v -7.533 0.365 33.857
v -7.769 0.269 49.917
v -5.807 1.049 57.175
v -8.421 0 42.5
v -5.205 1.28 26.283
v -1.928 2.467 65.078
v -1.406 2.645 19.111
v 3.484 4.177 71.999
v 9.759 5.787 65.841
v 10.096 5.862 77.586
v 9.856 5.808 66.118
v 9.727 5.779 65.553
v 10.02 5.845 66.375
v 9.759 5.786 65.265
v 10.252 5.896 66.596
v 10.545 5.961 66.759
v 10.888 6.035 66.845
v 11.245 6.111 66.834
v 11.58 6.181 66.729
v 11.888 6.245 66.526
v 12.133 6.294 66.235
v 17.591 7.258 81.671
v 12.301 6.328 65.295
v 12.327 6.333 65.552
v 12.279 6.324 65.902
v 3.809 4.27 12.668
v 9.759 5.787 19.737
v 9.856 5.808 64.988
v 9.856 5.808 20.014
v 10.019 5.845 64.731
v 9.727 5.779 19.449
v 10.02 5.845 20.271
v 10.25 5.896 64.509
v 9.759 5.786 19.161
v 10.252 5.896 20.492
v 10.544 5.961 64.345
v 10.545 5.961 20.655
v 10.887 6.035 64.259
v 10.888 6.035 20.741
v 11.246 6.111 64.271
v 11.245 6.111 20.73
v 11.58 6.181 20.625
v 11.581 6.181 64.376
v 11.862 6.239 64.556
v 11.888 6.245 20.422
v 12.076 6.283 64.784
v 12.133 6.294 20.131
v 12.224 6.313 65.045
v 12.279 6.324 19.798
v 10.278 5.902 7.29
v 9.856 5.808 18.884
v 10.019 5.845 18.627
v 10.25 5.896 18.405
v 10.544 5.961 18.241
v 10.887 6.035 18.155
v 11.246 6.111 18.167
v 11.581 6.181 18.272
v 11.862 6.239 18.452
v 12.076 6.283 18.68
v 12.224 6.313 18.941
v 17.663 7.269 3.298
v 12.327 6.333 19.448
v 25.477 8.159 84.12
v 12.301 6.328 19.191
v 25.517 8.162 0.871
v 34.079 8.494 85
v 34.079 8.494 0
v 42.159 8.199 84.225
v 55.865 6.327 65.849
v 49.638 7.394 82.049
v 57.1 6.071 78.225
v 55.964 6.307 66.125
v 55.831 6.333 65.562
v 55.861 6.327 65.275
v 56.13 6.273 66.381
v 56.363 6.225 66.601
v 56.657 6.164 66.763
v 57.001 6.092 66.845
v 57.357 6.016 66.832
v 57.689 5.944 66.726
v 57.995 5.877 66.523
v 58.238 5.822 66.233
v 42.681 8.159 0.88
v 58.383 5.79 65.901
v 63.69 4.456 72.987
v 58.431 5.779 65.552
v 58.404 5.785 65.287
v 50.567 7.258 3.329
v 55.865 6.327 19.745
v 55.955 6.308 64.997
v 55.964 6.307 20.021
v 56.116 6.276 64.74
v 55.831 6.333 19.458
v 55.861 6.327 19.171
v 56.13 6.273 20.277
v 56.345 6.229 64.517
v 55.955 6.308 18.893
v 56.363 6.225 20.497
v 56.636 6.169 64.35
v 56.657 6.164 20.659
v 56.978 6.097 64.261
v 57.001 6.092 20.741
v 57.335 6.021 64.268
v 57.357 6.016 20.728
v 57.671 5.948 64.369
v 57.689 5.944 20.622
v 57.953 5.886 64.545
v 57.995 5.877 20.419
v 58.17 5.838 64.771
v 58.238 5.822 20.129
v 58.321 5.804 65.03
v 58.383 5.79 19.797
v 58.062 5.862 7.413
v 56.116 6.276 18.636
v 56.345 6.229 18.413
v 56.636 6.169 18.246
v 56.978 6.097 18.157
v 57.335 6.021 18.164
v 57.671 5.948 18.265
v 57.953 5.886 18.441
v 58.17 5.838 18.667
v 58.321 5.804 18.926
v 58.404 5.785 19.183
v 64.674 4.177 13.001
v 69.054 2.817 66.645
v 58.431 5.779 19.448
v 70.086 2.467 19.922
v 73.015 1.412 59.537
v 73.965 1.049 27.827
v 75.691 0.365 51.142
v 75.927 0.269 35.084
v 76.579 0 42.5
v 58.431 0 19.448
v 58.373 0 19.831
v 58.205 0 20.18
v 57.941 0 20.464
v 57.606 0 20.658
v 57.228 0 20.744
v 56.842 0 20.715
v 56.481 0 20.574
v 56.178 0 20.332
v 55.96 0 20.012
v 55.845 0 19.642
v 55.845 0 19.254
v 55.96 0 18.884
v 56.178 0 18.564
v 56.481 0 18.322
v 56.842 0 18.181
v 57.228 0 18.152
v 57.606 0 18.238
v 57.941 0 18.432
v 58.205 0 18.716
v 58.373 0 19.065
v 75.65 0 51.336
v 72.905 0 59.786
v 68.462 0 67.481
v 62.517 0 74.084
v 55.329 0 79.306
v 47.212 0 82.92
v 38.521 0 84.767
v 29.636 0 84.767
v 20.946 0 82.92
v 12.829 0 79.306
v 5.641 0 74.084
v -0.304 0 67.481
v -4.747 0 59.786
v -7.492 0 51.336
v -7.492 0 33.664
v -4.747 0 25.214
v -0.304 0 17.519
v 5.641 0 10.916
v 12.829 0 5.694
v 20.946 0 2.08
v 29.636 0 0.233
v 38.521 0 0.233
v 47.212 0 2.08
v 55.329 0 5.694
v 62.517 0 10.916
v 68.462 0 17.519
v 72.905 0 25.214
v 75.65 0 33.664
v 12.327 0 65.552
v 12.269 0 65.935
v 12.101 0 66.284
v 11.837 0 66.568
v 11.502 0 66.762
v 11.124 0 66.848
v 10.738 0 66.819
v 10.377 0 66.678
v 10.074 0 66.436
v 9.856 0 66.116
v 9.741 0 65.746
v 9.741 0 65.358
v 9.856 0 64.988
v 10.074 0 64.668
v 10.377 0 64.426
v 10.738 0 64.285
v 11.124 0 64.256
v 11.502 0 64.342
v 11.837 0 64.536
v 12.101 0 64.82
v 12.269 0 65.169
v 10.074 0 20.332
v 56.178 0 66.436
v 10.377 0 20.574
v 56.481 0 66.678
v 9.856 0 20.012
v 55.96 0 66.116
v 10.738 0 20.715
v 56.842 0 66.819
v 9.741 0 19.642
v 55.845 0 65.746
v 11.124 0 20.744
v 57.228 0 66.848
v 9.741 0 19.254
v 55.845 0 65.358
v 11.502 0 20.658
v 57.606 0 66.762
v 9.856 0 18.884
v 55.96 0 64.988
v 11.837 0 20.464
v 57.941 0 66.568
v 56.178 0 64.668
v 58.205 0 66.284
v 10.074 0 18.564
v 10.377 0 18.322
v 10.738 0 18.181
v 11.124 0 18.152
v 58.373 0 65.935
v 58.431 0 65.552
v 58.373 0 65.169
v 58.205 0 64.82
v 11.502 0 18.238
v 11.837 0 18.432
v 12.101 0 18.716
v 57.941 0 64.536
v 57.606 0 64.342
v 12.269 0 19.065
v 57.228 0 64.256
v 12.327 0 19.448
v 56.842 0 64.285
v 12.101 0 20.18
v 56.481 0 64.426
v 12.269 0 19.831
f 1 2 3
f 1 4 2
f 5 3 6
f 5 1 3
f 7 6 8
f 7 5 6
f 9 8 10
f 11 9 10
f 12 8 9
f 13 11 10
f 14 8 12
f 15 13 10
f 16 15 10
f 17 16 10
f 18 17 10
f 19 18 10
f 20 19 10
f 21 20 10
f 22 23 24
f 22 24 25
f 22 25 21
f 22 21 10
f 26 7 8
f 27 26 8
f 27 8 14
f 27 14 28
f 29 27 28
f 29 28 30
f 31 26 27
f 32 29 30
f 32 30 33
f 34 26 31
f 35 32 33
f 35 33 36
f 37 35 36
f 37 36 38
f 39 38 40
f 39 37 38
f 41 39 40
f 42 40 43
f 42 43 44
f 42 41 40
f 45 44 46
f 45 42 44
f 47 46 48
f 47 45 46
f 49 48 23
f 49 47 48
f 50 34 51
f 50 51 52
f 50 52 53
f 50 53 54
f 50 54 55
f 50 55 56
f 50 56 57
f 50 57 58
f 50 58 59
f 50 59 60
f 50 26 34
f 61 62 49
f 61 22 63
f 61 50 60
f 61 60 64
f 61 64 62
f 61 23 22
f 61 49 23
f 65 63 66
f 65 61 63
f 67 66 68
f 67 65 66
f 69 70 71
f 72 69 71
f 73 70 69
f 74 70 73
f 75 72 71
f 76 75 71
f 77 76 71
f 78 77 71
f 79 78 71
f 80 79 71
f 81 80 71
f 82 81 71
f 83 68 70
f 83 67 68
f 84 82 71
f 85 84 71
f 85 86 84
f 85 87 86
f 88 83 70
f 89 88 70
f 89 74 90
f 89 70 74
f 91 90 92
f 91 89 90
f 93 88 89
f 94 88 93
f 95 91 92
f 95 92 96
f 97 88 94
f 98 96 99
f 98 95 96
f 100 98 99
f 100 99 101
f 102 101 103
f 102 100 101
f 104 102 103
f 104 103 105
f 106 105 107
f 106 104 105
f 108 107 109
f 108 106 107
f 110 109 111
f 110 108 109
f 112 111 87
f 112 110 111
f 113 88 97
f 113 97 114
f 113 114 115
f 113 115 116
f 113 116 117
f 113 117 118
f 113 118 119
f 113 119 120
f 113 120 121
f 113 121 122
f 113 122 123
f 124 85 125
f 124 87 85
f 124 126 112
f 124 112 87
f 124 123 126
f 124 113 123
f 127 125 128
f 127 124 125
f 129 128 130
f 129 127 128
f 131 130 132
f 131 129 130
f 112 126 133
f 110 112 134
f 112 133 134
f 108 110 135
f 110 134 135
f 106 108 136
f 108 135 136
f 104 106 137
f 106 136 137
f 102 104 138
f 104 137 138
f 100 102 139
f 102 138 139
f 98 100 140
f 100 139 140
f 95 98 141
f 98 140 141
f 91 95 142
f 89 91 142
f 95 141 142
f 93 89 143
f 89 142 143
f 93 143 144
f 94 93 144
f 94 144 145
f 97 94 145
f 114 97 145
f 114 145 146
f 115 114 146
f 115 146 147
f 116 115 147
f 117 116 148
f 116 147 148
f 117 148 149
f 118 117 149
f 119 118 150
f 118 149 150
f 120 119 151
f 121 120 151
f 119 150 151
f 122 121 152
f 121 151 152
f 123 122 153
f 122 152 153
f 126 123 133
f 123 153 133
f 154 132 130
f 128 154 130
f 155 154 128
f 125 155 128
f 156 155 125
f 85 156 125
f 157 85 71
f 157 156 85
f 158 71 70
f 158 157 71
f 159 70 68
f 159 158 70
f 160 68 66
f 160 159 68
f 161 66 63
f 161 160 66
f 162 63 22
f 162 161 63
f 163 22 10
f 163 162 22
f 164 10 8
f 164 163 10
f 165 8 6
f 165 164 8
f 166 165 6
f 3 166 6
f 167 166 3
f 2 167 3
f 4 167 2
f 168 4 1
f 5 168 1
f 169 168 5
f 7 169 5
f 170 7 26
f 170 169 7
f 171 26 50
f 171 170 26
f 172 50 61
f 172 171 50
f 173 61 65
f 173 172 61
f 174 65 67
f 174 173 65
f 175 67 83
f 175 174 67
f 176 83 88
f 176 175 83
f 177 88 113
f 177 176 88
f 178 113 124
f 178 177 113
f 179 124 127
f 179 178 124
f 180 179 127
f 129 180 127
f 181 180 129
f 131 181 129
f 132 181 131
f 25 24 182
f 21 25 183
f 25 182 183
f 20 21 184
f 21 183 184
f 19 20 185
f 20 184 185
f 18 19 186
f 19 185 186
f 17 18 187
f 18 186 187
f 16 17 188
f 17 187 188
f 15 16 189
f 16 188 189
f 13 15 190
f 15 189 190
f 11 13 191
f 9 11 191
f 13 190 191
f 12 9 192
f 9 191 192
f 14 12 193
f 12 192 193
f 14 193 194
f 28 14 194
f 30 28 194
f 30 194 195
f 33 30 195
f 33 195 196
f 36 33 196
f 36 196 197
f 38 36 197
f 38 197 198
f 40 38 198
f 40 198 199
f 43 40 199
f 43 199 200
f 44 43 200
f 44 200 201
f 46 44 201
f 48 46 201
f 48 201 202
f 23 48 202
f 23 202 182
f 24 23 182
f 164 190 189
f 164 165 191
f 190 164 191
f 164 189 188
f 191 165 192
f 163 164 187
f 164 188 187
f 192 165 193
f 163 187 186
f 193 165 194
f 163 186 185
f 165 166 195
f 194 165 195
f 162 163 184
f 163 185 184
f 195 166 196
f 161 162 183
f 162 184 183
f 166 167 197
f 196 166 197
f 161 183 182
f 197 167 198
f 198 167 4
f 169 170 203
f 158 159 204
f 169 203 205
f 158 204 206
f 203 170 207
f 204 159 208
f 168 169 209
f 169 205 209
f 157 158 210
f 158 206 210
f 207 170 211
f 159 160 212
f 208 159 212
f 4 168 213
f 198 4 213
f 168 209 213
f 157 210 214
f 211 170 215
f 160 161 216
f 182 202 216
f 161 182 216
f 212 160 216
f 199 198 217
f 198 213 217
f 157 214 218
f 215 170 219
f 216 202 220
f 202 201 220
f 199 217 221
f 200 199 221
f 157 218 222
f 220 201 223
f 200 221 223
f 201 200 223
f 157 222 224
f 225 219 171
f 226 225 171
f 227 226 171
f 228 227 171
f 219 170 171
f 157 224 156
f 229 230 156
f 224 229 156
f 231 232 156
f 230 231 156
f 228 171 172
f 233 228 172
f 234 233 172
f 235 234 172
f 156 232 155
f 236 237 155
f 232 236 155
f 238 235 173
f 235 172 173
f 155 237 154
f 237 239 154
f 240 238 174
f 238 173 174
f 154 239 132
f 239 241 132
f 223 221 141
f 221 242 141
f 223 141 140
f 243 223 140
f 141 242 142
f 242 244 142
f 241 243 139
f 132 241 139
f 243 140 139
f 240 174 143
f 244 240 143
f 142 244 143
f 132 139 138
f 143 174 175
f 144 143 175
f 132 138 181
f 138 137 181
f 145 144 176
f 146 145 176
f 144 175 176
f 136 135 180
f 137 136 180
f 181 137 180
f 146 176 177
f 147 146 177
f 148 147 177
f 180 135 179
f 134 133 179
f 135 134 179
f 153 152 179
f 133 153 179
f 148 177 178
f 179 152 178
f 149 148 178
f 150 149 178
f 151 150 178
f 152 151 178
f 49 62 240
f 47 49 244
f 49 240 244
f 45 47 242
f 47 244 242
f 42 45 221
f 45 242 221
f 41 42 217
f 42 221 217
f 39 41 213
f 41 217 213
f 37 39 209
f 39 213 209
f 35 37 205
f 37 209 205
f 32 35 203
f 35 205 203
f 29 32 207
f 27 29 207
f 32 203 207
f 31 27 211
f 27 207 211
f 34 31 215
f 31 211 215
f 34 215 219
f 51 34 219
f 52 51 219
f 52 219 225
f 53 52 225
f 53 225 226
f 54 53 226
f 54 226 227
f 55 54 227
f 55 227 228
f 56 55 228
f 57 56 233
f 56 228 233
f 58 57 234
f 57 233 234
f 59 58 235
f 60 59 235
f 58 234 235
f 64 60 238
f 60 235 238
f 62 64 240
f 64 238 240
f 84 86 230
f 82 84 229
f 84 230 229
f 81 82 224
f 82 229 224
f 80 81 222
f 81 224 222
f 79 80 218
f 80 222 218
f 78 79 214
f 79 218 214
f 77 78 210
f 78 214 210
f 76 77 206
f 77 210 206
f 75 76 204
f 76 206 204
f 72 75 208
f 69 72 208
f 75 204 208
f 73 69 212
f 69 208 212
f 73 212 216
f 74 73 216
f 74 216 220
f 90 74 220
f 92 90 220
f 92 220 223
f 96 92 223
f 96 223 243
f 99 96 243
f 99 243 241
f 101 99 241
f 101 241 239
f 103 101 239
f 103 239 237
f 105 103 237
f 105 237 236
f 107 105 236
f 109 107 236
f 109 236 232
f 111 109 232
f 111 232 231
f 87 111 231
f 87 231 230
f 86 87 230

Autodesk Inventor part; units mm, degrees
ref_plane "YZ Plane" through (0, 0, 0) normal (1, 0, 0) x (0, 1, 0)
ref_plane "XZ Plane" through (0, 0, 0) normal (0, 1, 0) x (-1, 0, 0)
ref_plane "XY Plane" through (0, 0, 0) normal (0, 0, 1) x (1, 0, 0)
sketch "Sketch1" plane through (0, 0, 0) normal (0, 0, 1) x (1, 0, 0)
  arc A0 (76.5789, 0) -> (-8.4211, 0) centre (34.0789, -102.0754) ccw
  line L0 (-8.4211, 0) -> (76.5789, 0)
  point P0 (0, 0)
  dimension "d0" = 85
extrude "Extrusion1" add sketch "Sketch1" along normal blind 85
sketch "Sketch2" plane through (-8.4211, 0, 0) normal (0, -1, 0) x (1, 0, 0)
  circle A0 centre (7.5, 77.5) radius 0.75
  circle A1 centre (7.5, 7.5) radius 0.75
  circle A2 centre (77.5, 77.5) radius 0.75
  circle A3 centre (77.5, 7.5) radius 0.75
  line L0 (0, 85) -> (85, 85) projected
  line L1 (0, 0) -> (85, 0) projected
  line L2 (85, 0) -> (85, 85) projected
  point P0 (8.4211, 0)
  point P1 (36.7967, 13.095)
  dimension "d3" = 1.5
  dimension "d4" = 1.5
  dimension "d5" = 1.5
  dimension "d6" = 1.5
  dimension "d7" = 70
  dimension "d8" = 7.5
  dimension "d9" = 7.5
  dimension "d10" = 70
  dimension "d11" = 70
  dimension "d12" = 70
  dimension "d13" = 7.5
  dimension "d14" = 7.5
extrude "Extrusion2" cut sketch "Sketch2" against normal blind 85
sketch "Sketch3" plane through (-8.4211, 0, 0) normal (0, -1, 0) x (1, 0, 0)
  line L0 (0, 0) -> (0, 85) projected
  line L1 (0, 42.5) -> (85, 42.5)
  line L2 (85, 0) -> (85, 85) projected
  line L3 (0, 85) -> (85, 85) projected
  line L4 (42.5, 85) -> (42.5, 0)
  circle A0 centre (42.5, 42.5) radius 42.5
  line L5 (0, 0) -> (85, 0) projected
  line L6 (85, 85) -> (0, 85)
  line L7 (0, 85) -> (0, 0)
  line L8 (0, 0) -> (85, 0)
  line L9 (85, 0) -> (85, 85)
  point P0 (8.4211, 0)
  dimension "d17" = 42.5
extrude "Extrusion3" cut sketch "Sketch3" against normal blind 100 contours L0 A0 L5 | L0 L3 A0 | A0 L2 L5 | L3 L2 A0
sketch "Sketch4" plane through (34.0789, 0, 42.5) normal (0, -1, 0) x (1, 0, 0)
  arc A0 (-42.5, 0) -> (42.5, 0) centre (0, 0) ccw projected
  line L0 (0, 0) -> (42.5, 0) construction
  line L1 (30.052, 30.052) -> (-30.052, 30.052)
  line L2 (-30.052, 30.052) -> (-30.052, -30.052)
  line L3 (-30.052, -30.052) -> (30.052, -30.052)
  line L4 (30.052, -30.052) -> (30.052, 30.052)
  circle A1 centre (-23.052, 23.052) radius 1.3
  circle A2 centre (23.052, 23.052) radius 1.3
  circle A3 centre (-23.052, -23.052) radius 1.3
  circle A4 centre (23.052, -23.052) radius 1.3
  point P0 (-34.0789, -42.5)
  dimension "d21" = 2.6
  dimension "d22" = 2.6
  dimension "d23" = 2.6
  dimension "d24" = 2.6
  dimension "d29" = 7
  dimension "d30" = 7
  dimension "d31" = 7
  dimension "d32" = 7
  dimension "d33" = 7
  dimension "d34" = 7
  dimension "d35" = 7
  dimension "d36" = 7
extrude "Extrusion4" cut sketch "Sketch4" against normal blind 100 contours A1 | A2 | A3 | A4
properties part number "TopHead"
